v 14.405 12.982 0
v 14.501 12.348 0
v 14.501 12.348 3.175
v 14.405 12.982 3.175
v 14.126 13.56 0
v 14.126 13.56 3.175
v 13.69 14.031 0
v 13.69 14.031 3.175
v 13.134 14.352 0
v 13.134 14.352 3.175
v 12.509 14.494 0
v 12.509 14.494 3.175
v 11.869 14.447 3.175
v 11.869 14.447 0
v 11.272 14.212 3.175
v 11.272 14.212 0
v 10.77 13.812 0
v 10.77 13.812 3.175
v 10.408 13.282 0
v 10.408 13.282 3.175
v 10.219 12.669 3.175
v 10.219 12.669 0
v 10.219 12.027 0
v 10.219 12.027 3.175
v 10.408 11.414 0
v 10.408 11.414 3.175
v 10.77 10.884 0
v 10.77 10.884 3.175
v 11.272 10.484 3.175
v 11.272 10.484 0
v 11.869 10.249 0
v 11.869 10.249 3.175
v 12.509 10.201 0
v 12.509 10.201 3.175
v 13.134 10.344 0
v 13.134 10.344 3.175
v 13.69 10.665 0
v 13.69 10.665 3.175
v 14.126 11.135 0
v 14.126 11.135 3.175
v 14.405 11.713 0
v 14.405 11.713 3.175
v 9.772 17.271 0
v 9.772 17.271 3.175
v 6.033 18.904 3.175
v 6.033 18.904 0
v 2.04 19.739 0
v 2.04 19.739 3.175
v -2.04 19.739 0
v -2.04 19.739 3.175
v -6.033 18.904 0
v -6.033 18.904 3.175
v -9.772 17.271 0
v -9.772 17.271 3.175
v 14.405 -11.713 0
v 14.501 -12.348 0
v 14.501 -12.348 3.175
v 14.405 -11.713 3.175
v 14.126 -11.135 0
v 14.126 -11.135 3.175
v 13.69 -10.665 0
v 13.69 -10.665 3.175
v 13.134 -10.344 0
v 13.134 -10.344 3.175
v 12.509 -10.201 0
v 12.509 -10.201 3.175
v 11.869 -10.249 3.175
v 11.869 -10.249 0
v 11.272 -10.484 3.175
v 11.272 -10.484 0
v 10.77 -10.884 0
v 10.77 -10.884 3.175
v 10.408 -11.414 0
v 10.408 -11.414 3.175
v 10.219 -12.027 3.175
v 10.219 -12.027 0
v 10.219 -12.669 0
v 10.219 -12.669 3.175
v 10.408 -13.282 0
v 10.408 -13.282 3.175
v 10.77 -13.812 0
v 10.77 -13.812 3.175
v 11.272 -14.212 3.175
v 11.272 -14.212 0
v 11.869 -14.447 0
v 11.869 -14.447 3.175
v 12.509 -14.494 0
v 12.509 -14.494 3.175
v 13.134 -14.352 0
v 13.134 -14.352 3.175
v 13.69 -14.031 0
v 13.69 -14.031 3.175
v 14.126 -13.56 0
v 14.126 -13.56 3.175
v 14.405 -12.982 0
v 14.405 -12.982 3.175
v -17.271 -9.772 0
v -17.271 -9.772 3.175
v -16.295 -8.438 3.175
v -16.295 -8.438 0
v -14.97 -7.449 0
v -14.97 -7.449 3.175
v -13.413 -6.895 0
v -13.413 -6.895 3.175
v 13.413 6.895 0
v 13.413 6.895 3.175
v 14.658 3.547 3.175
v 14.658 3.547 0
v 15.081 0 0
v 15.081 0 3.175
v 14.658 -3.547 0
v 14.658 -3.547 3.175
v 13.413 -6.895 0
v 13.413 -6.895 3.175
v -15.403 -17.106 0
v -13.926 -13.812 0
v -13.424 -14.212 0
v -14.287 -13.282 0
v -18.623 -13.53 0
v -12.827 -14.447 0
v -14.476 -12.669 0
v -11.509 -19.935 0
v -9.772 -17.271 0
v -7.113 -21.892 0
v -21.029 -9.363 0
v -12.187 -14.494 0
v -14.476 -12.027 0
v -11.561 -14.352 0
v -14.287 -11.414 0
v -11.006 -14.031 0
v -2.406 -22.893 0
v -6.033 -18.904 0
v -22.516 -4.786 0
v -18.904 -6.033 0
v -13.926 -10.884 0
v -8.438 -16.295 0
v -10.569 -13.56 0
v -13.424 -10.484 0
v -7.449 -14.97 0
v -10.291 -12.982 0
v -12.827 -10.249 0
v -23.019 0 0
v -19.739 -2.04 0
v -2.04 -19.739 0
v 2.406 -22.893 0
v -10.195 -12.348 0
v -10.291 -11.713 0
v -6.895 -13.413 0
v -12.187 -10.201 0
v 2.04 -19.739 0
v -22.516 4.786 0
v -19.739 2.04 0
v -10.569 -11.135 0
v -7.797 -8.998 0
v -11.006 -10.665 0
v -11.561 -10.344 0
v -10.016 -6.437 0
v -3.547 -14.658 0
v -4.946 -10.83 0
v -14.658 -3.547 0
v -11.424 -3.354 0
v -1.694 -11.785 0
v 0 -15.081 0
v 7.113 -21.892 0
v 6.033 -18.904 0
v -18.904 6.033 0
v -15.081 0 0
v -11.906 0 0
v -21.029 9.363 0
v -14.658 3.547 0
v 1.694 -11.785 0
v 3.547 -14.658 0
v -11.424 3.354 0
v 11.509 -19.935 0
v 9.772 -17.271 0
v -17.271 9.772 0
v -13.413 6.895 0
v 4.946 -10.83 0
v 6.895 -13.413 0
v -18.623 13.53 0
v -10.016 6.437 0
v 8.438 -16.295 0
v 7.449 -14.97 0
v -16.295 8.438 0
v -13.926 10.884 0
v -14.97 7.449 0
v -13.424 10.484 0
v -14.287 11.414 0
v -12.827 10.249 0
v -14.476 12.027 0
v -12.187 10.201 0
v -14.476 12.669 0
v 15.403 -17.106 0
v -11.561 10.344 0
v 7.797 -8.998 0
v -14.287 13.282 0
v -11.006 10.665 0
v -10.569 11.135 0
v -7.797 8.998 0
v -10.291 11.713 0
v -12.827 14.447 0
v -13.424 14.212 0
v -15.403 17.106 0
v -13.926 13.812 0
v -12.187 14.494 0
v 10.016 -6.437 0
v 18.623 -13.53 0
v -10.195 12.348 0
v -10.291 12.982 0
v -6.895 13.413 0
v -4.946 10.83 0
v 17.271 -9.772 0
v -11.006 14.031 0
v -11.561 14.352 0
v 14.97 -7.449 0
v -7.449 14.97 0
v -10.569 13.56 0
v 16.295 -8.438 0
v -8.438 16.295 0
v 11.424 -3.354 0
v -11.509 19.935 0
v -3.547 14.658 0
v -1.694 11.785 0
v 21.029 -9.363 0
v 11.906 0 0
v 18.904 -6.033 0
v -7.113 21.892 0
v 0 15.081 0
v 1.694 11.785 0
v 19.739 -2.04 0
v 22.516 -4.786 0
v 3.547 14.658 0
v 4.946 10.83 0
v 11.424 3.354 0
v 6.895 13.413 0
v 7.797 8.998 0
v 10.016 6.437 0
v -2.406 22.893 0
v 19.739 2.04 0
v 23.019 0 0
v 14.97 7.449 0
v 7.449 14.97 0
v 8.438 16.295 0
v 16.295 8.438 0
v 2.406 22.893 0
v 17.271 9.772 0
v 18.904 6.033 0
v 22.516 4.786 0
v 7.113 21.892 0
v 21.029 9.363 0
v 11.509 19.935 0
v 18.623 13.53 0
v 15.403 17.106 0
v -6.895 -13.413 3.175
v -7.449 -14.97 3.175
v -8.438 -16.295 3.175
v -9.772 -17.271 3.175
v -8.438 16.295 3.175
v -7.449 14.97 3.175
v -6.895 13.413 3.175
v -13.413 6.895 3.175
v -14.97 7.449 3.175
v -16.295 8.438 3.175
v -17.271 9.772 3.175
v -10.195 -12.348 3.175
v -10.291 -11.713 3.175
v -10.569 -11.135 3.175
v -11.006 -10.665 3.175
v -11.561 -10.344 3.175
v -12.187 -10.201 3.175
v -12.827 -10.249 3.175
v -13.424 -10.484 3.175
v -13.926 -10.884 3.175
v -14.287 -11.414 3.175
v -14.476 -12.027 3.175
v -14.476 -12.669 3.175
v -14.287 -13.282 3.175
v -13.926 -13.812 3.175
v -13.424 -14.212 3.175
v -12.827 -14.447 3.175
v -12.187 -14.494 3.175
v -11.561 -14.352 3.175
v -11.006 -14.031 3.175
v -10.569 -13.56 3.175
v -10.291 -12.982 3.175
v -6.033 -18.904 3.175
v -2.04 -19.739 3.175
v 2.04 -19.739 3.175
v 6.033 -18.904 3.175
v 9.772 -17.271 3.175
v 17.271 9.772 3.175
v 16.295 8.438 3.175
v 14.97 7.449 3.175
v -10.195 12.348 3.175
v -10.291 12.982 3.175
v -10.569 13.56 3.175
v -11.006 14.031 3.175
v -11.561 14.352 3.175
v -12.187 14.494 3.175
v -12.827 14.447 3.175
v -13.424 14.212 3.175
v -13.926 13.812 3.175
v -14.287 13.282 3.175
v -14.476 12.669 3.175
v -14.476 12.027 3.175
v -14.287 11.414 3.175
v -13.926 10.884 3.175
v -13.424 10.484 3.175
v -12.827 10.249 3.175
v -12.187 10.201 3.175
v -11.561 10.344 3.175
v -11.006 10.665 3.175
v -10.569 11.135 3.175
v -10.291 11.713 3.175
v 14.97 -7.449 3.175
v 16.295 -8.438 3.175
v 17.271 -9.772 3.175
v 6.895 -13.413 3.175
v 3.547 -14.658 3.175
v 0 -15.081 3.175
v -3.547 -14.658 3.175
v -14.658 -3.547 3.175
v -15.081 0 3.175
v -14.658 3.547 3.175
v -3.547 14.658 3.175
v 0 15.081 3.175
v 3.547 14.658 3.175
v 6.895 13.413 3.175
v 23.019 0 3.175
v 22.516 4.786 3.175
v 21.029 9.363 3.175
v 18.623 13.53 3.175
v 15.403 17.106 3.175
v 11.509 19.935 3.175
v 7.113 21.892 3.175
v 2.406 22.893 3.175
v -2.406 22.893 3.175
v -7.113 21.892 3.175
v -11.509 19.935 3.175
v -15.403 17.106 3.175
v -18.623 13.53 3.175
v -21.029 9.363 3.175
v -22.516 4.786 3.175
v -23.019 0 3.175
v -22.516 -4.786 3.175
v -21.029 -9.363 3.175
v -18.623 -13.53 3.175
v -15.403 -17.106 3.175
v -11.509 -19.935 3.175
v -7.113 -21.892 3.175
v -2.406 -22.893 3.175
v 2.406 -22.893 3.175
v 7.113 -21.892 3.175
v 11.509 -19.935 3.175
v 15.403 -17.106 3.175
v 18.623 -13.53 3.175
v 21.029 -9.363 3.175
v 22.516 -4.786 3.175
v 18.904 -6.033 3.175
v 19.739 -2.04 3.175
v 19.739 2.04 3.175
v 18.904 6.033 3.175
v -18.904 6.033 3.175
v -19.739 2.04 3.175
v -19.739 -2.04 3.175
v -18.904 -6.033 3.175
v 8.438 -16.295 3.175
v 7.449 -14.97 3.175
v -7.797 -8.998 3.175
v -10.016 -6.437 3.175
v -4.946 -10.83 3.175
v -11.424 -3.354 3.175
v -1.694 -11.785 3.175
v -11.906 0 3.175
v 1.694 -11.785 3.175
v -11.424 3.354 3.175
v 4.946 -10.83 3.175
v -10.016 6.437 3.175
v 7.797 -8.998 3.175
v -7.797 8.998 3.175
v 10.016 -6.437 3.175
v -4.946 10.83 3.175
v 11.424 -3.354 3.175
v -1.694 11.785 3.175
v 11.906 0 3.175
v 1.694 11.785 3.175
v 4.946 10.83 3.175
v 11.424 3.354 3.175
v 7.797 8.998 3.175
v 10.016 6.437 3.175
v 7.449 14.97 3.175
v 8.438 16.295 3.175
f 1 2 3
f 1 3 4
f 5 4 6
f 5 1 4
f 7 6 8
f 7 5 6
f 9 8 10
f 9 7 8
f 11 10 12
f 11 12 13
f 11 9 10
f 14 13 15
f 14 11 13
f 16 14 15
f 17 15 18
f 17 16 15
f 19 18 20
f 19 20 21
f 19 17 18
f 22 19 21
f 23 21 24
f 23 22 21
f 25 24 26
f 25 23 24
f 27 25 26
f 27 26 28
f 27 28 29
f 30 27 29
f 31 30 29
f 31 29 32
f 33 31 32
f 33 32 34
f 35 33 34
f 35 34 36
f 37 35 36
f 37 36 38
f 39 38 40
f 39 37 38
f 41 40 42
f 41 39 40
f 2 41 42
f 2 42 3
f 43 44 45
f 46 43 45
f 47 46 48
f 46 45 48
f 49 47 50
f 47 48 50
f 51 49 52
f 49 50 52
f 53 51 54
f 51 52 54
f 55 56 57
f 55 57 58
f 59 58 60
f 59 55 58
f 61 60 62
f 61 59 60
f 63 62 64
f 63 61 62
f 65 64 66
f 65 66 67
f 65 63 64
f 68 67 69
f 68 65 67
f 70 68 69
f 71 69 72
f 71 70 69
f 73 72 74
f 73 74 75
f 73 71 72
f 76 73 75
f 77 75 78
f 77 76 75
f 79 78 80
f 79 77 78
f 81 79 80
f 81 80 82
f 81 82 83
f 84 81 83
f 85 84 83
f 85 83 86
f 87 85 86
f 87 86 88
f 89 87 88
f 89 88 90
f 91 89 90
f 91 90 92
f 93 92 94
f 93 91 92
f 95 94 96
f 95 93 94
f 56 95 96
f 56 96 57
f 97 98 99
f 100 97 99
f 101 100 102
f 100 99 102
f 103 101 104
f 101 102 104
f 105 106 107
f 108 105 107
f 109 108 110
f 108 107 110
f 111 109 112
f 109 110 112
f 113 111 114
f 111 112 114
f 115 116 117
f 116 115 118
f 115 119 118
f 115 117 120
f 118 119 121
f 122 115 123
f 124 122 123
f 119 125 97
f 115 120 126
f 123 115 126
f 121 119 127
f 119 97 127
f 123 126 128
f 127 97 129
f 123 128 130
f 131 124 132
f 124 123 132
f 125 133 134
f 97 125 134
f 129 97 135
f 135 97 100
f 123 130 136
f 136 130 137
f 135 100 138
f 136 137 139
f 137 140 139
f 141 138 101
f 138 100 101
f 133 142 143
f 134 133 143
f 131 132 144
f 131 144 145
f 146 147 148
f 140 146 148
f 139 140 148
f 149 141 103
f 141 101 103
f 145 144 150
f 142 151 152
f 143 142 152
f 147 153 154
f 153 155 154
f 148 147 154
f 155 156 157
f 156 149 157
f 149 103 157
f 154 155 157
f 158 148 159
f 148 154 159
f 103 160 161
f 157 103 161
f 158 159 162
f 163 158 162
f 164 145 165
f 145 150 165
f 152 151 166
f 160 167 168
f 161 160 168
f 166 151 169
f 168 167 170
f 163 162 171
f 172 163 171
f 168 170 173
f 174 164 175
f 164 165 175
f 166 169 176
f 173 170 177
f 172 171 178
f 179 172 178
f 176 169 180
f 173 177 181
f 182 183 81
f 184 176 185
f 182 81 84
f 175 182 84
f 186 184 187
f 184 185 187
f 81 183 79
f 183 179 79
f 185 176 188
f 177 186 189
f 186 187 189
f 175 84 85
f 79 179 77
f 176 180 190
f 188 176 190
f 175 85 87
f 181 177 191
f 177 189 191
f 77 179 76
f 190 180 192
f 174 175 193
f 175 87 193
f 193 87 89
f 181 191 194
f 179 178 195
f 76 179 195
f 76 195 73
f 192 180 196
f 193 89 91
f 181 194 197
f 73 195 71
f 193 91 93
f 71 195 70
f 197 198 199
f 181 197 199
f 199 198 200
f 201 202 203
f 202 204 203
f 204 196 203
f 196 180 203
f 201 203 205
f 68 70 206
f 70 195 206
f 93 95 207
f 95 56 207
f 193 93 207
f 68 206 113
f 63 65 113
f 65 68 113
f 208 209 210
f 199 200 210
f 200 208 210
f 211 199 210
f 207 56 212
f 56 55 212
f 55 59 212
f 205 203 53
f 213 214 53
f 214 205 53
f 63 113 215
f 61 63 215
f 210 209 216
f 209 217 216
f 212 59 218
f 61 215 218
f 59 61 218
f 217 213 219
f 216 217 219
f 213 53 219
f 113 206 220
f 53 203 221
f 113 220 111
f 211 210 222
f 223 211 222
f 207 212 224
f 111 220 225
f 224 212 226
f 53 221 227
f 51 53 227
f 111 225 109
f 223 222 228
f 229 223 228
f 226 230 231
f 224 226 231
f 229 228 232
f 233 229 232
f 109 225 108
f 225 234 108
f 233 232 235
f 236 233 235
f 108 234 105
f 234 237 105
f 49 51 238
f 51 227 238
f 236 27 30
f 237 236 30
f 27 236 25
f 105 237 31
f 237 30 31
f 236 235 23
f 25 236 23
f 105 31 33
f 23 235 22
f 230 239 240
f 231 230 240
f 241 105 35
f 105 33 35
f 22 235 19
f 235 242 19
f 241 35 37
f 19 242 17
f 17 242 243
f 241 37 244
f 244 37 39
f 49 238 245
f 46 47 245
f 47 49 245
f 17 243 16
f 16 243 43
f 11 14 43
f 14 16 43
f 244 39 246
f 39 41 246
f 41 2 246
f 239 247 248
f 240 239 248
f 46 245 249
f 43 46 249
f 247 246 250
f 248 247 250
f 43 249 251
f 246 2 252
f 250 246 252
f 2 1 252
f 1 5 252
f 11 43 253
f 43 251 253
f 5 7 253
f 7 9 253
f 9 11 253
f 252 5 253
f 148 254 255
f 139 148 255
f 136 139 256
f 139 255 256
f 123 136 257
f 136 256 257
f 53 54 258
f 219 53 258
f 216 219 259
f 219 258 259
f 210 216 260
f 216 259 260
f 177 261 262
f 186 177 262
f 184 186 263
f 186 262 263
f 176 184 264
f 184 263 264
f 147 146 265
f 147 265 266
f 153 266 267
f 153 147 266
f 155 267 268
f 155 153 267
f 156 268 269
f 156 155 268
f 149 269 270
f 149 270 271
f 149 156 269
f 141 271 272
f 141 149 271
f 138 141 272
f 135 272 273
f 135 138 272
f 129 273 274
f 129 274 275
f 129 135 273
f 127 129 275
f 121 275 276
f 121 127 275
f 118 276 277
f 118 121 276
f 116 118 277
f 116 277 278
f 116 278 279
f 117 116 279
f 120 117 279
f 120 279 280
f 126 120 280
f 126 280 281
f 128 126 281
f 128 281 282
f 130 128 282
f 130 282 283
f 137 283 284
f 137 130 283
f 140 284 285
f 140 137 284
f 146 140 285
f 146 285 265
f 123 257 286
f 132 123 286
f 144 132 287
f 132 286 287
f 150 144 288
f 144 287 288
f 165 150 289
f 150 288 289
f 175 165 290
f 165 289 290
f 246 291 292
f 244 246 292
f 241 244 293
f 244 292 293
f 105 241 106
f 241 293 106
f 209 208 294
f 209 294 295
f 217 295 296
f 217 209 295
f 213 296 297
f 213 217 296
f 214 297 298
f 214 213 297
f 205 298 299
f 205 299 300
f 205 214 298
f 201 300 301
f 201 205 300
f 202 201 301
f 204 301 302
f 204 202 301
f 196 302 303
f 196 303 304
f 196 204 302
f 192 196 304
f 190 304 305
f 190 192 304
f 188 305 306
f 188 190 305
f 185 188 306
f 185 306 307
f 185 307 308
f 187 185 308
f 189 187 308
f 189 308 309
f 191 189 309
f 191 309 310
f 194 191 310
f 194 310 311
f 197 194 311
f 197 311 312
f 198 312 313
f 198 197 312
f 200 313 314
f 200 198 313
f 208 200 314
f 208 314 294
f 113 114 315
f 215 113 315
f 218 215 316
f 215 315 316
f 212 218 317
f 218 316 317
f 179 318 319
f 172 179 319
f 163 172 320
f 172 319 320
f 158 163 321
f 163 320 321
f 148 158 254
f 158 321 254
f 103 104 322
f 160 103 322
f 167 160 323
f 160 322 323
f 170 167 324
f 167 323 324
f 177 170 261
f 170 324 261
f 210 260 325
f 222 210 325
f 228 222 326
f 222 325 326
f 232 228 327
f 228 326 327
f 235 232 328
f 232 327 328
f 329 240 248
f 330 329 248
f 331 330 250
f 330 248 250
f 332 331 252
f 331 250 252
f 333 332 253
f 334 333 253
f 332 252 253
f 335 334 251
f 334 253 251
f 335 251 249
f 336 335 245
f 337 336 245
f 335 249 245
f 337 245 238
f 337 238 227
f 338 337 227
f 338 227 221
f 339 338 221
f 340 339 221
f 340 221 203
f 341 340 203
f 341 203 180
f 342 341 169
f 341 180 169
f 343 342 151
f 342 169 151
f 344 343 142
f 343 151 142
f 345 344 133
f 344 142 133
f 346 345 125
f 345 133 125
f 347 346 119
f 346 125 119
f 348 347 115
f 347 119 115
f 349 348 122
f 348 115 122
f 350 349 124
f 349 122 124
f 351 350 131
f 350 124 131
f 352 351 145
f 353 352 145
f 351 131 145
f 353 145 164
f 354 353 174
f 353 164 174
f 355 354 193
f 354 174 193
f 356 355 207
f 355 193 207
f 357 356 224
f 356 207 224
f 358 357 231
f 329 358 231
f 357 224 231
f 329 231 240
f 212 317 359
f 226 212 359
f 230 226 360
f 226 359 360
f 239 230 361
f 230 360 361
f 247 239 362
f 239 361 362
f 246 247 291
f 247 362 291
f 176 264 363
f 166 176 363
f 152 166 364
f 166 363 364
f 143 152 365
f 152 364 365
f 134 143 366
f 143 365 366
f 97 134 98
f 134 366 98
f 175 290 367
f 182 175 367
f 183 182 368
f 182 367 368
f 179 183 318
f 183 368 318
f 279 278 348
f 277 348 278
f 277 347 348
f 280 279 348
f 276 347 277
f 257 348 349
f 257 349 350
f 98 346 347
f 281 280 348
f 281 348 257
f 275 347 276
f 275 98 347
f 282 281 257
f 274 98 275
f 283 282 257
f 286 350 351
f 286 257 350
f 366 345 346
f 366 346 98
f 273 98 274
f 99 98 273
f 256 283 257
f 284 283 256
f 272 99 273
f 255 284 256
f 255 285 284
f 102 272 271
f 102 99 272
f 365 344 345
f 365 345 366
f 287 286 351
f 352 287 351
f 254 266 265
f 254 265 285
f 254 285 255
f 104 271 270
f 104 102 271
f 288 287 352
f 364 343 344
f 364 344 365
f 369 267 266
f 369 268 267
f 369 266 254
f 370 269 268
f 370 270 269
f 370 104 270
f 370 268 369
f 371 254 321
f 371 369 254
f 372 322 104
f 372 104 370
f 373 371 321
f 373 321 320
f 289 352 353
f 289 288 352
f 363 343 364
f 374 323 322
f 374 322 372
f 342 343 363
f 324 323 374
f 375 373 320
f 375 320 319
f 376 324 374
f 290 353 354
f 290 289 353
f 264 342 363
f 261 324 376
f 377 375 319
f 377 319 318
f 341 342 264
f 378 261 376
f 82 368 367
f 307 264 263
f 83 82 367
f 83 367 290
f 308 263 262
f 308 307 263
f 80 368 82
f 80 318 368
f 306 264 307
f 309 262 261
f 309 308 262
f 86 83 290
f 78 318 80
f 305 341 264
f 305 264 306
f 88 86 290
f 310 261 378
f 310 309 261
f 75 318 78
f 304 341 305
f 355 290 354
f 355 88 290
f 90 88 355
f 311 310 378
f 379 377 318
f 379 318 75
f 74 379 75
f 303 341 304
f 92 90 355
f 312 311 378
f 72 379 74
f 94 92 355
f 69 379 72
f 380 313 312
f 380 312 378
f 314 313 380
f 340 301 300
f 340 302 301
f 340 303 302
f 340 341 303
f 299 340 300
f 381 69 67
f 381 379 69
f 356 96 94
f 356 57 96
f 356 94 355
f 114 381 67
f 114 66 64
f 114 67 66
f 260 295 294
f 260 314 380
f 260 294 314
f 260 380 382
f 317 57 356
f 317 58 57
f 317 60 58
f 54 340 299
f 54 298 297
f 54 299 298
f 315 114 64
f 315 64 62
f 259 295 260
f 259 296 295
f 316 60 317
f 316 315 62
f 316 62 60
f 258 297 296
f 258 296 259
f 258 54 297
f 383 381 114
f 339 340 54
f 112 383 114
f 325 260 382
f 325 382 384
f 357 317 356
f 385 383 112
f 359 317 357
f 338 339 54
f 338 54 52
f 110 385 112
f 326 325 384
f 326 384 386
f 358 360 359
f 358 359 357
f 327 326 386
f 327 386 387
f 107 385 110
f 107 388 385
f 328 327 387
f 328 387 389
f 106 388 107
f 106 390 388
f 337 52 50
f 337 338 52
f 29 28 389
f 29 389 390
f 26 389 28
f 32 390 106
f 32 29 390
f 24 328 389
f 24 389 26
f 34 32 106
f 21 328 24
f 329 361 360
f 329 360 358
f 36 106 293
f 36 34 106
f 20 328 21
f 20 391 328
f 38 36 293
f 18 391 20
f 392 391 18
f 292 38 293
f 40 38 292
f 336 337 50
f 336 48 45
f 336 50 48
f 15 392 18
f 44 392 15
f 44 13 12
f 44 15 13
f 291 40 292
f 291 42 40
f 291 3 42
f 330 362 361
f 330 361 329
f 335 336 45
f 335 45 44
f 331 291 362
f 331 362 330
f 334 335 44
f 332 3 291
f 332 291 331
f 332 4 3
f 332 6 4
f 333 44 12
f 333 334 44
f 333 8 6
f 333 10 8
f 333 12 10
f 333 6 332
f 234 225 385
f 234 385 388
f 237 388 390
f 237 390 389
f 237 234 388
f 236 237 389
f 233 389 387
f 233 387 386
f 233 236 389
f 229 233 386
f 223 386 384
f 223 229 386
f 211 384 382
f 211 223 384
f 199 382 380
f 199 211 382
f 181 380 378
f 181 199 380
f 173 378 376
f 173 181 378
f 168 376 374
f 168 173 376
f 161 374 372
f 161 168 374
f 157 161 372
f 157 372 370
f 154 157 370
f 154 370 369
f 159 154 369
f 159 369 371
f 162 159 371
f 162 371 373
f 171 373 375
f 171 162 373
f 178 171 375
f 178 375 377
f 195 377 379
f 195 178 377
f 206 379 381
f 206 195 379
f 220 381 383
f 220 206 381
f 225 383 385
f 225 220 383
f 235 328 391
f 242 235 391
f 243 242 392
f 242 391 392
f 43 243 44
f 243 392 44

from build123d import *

# Parameters (mm, degrees)
F0_R            = 23.01875
F0_R_2          = 2.15265
F0_R_3          = 11.90625
F1_DEPTH        = 3.175
F3_DEPTH        = 3.175
F3_COPIES_COUNT = 4


# Not quite as in the source:
# - a pattern or mirror of a feature is missing from the dataset's text; its kind, count and spacing are read off the source's solid


with BuildPart() as f1:
    # F0 (on Top) → F1 (new body)
    with BuildSketch(Plane.XY):
        Circle(F0_R)
        with Locations((-12.3478521665, -12.3478521665)):
            Circle(F0_R_2, mode=Mode.SUBTRACT)
        with Locations((12.3478521665, -12.3478521665)):
            Circle(F0_R_2, mode=Mode.SUBTRACT)
        with Locations((-12.3478521665, 12.3478521665)):
            Circle(F0_R_2, mode=Mode.SUBTRACT)
        Circle(F0_R_3, mode=Mode.SUBTRACT)
        with Locations((12.3478521665, 12.3478521665)):
            Circle(F0_R_2, mode=Mode.SUBTRACT)
    extrude(amount=F1_DEPTH)

    # F2 (on face) → F3 (cut, through all)
    with BuildSketch(Plane.XY.offset(3.175)):
        with BuildLine():
            ThreePointArc((-9.7719120136, 17.2709047146), (-7.8938999882, 15.6696324205), (-6.8946489019, 13.4129757356))
            ThreePointArc((-6.8946489019, 13.4129757356), (0, 15.08125), (6.8946489019, 13.4129757356))
            ThreePointArc((6.8946489019, 13.4129757356), (7.8938999882, 15.6696324205), (9.7719120136, 17.2709047146))
            ThreePointArc((9.7719120136, 17.2709047146), (0, 19.84375), (-9.7719120136, 17.2709047146))
        make_face()
    f3 = extrude(amount=-F3_DEPTH, mode=Mode.SUBTRACT)

    # F3_copies: F3 ×4 about axis
    f3_copies_axis = Axis((0, 0, 0), (0, 0, 1))
    for i in range(1, F3_COPIES_COUNT):
        add(f3.rotate(f3_copies_axis, i * 360 / F3_COPIES_COUNT), mode=Mode.SUBTRACT)


solid = f1.part
